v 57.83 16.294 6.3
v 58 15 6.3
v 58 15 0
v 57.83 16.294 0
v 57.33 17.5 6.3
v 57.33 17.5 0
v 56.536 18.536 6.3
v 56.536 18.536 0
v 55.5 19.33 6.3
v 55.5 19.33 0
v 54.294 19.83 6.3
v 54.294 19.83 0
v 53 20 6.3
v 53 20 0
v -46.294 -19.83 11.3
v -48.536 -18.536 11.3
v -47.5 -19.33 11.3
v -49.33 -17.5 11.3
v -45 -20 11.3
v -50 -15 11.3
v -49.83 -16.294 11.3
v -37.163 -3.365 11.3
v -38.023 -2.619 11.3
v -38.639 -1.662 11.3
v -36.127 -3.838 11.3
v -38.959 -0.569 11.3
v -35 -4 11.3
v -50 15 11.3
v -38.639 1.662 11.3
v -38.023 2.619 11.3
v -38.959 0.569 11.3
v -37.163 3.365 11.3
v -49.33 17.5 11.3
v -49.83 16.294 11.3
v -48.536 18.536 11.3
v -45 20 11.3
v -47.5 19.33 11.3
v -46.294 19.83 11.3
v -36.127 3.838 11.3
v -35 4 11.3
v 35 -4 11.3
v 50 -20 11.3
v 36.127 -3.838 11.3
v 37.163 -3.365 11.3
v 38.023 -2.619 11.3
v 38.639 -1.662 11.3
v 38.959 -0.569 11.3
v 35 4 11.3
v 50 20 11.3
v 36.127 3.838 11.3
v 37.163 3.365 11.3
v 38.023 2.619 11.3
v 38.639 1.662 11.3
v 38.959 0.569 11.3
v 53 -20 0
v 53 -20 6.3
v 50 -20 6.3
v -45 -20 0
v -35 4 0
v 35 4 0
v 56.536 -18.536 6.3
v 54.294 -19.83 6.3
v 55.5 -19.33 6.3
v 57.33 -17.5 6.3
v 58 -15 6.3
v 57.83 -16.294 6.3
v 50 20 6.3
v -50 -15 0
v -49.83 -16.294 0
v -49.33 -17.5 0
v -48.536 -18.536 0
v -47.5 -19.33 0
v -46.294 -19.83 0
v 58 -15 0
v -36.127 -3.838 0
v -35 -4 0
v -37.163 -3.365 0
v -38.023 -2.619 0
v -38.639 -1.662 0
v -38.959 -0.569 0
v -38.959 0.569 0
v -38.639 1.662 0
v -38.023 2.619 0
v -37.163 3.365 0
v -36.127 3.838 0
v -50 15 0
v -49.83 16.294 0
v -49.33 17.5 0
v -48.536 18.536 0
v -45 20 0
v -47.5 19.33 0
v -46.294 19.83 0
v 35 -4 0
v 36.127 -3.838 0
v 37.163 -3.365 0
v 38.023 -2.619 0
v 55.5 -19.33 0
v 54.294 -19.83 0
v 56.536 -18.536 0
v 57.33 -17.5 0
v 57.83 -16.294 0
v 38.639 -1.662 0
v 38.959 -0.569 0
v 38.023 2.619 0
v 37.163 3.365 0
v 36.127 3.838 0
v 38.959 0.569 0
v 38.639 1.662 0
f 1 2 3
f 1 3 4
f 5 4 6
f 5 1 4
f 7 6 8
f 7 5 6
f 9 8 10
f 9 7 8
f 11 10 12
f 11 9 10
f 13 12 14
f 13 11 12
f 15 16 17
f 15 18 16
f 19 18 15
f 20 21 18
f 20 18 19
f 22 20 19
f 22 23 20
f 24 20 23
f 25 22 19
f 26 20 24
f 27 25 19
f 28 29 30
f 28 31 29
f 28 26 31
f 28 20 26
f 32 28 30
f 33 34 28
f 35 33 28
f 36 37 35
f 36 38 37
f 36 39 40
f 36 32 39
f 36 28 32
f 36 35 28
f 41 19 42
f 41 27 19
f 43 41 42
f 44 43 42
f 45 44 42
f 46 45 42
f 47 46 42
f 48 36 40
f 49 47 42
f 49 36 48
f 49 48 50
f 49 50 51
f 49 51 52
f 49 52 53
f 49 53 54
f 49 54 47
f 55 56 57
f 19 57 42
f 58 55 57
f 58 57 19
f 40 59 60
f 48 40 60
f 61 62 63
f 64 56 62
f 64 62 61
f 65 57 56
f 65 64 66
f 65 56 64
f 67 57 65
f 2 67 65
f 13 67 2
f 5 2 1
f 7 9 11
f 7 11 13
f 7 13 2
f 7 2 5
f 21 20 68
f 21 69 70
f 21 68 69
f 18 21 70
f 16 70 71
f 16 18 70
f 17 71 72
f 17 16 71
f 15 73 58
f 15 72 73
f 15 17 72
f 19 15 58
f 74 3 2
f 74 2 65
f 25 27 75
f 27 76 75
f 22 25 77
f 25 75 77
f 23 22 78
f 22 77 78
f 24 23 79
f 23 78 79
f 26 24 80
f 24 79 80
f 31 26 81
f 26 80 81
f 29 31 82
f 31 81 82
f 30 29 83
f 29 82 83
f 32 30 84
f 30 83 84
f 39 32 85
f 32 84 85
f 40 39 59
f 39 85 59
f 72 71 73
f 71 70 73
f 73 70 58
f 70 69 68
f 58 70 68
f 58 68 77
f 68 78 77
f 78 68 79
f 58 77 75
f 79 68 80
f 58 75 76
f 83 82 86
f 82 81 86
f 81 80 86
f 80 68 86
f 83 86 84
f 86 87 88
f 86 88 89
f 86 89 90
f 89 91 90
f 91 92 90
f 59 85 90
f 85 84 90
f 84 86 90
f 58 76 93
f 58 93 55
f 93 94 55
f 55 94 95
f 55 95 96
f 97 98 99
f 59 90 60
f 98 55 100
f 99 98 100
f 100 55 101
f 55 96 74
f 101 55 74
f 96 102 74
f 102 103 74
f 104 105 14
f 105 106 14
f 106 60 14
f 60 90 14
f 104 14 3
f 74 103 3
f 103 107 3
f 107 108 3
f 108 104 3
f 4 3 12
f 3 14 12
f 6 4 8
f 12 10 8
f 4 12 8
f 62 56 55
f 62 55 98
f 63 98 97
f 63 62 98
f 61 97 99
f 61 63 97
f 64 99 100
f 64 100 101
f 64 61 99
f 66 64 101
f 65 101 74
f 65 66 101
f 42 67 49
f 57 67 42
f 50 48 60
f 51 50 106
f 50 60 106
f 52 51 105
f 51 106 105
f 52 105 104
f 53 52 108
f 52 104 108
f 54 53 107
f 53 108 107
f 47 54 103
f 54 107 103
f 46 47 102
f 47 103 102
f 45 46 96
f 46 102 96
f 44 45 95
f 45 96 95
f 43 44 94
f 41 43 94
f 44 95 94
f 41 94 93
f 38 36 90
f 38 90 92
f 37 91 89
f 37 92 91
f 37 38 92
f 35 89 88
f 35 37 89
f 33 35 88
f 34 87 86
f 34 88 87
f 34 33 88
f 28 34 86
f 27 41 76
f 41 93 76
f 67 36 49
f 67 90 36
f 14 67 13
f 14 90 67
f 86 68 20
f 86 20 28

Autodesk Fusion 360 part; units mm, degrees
sketch "Sketch3" plane through (0, 0, 0) normal (0, 0, 1) x (1, 0, 0)
  line L0 (50, -20) -> (-50, -20)
  line L1 (-50, -20) -> (-50, 20)
  line L2 (-50, 20) -> (50, 20)
  line L3 (50, 20) -> (50, -20)
  line L4 (50, -20) -> (-50, 20) construction
  line L5 (-50, -20) -> (50, 20) construction
  line L6 (35, -4) -> (-35, -4)
  line L7 (-35, -4) -> (-35, 4)
  line L8 (-35, 4) -> (35, 4)
  line L9 (35, 4) -> (35, -4)
  line L10 (35, -4) -> (-35, 4) construction
  line L11 (-35, -4) -> (35, 4) construction
  line L12 (50, 20) -> (58, 20)
  line L13 (58, 20) -> (58, -20)
  line L14 (58, -20) -> (50, -20)
  line L15 (50, -20) -> (50, 20)
  circle A0 centre (-35, 0) radius 4
  circle A1 centre (35, 0) radius 4
  dimension "d9" = 100
  dimension "d10" = 40
  dimension "d11" = 70
  dimension "d12" = 8
  dimension "d14" = 8
  dimension "d15" = 40
  dimension "d16" = 8
  dimension "d17" = 8
extrude "Extrude1" add sketch "Sketch3" along normal blind 11.3 contours L0 L1 L2 L3 L15
extrude "Extrude2" add sketch "Sketch3" along normal blind 6.3 contours L3 L12 L13 L14 L15
fillet "Fillet1" radius 5 4 edges at (-50, -20, 5.65) (-50, 20, 5.65) (58, 20, 3.15) (58, -20, 3.15)
equation "thickness = 11.3 mm"
equation "largeur = 40 mm"
equation "longueurTotal = 100 mm"
equation "diametre = 8 mm"
equation "epaulement = thickness - 5 mm"
equation "congés = 5 mm"
equation "longueurRainure = longueurTotal - 30 mm"
equation "largeurRainure = 8 mm"
equation "d9 = longueurTotal"
equation "d10 = largeur"
equation "d11 = longueurRainure"
equation "d12 = largeurRainure"
equation "largeurEpaulement = 8 mm"
equation "d14 = largeurEpaulement"
equation "d15 = largeur"
equation "d16 = diametre"
equation "d17 = diametre"
equation "d18 = thickness"
equation "d20 = epaulement"
equation "d23 = congés"
